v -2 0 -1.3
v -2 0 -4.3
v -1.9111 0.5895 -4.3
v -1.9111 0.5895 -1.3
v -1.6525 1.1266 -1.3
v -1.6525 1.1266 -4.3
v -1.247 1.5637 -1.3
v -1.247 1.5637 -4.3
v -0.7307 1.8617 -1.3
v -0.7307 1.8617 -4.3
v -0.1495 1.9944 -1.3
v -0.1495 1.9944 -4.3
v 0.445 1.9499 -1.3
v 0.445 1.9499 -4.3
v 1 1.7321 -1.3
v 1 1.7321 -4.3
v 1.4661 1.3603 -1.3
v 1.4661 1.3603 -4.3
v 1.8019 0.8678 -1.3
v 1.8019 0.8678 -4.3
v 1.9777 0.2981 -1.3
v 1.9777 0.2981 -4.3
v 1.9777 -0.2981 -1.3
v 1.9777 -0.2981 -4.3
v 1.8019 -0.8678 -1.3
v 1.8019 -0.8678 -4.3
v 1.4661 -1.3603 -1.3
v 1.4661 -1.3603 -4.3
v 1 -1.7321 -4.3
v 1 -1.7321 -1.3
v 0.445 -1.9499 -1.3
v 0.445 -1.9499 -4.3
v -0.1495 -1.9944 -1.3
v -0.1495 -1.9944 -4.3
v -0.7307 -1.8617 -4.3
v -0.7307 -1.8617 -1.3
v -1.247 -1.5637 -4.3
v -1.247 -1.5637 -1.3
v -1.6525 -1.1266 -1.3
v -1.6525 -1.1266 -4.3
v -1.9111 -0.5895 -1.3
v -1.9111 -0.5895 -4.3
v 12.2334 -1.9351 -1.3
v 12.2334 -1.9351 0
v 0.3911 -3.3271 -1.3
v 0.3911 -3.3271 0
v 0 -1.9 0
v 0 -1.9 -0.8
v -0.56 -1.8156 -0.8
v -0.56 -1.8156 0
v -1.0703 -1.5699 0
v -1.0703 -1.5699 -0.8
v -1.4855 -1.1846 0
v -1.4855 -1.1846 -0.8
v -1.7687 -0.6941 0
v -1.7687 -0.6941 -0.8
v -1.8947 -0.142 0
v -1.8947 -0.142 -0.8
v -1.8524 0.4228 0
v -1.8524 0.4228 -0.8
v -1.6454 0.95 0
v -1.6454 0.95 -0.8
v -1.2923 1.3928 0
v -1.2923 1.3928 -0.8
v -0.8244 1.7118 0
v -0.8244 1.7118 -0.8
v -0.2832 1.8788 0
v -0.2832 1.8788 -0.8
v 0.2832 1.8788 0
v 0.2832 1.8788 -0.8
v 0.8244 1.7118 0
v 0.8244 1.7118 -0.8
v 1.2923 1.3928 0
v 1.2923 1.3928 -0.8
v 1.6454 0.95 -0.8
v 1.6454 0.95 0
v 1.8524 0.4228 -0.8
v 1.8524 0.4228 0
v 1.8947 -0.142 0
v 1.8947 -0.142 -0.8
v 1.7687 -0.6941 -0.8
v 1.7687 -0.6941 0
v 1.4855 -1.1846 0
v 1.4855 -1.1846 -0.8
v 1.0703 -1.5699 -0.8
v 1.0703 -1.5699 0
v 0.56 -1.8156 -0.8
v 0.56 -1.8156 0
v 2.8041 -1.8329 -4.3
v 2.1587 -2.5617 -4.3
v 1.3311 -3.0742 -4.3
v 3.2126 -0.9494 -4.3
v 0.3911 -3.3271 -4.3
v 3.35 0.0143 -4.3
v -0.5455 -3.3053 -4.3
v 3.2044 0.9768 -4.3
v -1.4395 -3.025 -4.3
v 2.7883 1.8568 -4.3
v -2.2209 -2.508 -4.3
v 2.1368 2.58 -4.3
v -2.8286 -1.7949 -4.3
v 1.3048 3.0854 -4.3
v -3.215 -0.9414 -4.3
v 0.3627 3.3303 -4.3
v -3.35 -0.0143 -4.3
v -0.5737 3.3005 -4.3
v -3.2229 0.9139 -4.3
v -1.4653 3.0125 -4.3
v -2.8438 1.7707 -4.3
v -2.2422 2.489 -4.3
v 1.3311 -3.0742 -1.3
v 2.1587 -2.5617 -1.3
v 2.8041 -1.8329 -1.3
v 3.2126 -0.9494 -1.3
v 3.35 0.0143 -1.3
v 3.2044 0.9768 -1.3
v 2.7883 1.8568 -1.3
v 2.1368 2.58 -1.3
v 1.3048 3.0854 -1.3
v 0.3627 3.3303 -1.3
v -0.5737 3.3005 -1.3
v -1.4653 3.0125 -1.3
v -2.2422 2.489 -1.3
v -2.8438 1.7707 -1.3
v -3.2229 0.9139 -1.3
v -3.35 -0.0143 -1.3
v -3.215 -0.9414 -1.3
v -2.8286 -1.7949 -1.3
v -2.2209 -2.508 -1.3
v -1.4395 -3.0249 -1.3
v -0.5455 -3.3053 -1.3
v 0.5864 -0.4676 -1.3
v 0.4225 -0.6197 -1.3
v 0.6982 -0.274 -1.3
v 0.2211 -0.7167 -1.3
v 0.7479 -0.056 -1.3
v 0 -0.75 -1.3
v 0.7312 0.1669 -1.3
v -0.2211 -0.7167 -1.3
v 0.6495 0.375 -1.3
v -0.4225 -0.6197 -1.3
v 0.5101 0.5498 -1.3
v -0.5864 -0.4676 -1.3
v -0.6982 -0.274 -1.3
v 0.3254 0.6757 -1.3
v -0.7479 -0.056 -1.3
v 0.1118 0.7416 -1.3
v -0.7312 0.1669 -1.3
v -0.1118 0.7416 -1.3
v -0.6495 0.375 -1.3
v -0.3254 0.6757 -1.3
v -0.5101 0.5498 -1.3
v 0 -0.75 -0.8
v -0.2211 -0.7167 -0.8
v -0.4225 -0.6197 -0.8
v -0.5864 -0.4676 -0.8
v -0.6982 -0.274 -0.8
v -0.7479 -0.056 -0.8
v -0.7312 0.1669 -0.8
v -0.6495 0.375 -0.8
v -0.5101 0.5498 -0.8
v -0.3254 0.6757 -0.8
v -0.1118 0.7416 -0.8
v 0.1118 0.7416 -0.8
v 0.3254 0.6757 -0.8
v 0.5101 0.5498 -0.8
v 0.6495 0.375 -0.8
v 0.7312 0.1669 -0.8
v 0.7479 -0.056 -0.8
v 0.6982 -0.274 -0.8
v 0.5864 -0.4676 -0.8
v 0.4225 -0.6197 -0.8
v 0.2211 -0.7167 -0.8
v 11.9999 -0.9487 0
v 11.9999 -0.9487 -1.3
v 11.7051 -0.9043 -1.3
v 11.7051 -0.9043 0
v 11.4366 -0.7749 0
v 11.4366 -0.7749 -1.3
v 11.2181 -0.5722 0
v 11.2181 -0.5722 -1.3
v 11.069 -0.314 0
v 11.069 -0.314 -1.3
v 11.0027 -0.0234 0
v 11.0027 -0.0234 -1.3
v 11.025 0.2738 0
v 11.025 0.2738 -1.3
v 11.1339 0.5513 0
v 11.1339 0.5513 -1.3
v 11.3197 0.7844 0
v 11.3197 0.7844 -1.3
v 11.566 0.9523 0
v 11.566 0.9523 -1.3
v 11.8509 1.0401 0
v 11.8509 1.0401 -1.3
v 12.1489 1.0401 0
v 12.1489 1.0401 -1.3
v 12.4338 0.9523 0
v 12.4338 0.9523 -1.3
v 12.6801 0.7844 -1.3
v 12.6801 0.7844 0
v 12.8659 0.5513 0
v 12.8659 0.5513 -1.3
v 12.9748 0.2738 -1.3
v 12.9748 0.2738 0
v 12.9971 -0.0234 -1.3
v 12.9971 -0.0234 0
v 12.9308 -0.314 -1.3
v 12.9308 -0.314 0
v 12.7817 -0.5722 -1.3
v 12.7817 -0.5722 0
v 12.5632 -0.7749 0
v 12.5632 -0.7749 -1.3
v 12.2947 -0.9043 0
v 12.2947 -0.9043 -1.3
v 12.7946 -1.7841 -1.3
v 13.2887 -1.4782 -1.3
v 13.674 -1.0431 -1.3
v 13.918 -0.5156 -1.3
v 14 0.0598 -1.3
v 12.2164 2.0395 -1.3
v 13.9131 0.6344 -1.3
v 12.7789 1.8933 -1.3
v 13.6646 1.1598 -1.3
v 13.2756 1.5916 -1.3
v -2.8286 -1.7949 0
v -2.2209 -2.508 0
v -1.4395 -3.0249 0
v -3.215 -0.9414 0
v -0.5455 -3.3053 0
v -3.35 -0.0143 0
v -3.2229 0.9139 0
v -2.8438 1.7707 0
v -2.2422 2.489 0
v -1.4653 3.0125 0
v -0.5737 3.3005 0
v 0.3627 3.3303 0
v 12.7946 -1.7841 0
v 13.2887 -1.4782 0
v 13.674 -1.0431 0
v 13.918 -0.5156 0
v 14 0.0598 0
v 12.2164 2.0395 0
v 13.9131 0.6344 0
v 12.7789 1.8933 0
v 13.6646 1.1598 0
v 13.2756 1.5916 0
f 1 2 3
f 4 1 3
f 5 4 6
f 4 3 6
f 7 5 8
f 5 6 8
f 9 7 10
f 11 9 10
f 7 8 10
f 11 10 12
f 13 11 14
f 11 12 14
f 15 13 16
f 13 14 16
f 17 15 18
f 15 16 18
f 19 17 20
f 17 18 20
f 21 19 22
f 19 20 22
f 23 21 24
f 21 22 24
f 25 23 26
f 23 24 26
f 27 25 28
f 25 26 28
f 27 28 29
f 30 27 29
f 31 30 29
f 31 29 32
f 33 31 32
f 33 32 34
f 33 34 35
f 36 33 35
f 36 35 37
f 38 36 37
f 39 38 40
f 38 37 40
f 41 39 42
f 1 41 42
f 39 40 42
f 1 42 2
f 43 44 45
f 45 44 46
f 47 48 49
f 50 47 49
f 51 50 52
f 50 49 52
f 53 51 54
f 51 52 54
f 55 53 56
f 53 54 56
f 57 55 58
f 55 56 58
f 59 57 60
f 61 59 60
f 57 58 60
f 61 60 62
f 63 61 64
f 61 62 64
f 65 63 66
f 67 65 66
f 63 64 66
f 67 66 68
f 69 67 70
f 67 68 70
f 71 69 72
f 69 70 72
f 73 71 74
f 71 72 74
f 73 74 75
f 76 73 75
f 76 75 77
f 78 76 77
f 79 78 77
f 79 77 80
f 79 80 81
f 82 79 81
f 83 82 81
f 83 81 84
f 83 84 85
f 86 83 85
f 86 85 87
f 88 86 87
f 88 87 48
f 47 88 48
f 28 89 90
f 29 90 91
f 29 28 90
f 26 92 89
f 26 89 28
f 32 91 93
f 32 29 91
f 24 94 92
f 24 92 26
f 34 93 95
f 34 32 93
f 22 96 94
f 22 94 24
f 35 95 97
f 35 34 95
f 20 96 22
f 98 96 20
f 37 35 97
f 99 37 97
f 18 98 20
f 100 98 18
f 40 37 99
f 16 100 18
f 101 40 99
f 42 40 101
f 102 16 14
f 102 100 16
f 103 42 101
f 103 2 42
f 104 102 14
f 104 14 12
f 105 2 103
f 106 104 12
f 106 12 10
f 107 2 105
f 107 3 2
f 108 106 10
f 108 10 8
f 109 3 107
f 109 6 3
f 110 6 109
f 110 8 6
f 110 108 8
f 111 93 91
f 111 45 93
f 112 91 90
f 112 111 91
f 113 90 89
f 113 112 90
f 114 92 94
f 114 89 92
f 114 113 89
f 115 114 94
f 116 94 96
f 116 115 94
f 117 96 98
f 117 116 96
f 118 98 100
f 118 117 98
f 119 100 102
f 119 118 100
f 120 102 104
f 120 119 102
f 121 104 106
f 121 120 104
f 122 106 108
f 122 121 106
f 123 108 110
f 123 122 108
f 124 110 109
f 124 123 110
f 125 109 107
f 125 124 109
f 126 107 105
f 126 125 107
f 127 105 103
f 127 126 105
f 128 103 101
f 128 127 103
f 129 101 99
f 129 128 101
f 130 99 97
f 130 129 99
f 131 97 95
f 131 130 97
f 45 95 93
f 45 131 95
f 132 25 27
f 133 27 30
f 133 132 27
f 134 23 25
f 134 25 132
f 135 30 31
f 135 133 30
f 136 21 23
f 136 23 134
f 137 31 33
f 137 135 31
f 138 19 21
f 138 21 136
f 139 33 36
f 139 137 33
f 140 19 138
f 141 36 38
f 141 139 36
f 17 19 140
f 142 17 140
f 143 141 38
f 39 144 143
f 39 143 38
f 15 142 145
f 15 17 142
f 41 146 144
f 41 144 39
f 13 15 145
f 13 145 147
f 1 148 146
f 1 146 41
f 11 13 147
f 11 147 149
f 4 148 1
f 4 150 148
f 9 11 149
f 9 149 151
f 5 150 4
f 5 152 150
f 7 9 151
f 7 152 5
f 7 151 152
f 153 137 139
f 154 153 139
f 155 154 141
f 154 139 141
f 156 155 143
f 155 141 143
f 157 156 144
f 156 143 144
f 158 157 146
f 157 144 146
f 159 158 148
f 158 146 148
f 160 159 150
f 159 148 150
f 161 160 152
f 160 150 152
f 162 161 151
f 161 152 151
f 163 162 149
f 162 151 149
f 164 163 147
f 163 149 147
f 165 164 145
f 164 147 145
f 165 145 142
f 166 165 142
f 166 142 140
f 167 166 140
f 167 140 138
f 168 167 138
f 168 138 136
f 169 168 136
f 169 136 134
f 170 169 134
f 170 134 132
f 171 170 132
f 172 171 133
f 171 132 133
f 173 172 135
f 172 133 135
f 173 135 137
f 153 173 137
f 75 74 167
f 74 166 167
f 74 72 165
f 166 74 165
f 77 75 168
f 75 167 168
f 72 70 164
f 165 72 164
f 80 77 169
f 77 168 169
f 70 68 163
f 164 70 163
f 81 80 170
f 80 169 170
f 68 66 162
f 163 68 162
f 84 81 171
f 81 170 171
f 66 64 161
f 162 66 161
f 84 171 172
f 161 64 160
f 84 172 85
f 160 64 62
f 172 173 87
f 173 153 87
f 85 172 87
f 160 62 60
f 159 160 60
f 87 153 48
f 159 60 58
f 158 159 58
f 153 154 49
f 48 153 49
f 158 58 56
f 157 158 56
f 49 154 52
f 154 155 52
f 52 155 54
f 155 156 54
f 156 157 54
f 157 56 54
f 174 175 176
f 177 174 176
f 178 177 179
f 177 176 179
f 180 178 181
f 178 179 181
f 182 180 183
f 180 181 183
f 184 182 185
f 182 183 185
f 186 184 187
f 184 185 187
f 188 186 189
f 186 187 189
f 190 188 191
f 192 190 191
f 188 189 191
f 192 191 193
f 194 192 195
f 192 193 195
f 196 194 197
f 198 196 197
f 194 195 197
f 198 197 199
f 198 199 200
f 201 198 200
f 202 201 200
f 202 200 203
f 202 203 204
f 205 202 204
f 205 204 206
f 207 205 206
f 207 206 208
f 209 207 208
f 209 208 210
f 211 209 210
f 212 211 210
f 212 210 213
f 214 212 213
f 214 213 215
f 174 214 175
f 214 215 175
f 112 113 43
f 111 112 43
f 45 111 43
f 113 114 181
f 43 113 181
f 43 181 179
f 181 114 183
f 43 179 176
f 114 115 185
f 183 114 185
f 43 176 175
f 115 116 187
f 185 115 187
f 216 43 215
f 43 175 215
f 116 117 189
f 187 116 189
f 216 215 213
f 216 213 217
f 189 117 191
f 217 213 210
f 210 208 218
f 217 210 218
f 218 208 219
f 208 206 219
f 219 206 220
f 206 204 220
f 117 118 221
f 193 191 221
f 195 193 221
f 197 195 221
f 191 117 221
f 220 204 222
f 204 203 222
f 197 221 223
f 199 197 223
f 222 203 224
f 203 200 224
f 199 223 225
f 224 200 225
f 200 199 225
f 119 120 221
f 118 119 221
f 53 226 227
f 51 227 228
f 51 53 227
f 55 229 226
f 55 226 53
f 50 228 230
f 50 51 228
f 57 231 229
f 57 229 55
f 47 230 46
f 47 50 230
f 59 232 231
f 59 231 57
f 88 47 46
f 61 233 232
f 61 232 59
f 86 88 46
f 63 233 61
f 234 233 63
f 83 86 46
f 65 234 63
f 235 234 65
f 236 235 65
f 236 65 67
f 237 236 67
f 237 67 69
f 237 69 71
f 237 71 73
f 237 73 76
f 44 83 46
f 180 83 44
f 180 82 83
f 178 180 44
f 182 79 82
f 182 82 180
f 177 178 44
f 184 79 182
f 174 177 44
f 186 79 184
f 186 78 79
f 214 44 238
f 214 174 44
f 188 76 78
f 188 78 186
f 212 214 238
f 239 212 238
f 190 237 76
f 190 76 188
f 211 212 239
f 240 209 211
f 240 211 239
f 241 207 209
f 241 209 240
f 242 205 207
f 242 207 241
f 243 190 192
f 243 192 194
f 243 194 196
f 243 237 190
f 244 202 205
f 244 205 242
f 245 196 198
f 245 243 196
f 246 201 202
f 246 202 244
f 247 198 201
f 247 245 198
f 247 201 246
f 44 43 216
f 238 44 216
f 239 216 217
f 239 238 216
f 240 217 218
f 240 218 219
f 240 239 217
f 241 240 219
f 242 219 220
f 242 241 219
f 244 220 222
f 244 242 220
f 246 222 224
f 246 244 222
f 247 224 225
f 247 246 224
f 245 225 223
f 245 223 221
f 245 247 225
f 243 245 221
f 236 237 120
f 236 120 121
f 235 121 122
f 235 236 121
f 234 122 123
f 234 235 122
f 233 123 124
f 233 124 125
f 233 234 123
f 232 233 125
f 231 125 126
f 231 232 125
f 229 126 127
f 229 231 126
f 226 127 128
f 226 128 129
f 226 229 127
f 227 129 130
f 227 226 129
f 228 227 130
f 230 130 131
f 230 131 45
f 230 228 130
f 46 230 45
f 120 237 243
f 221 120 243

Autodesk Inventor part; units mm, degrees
ref_plane "YZ Plane" through (0, 0, 0) normal (1, 0, 0) x (0, 1, 0)
ref_plane "XZ Plane" through (0, 0, 0) normal (0, 1, 0) x (-1, 0, 0)
ref_plane "XY Plane" through (0, 0, 0) normal (0, 0, 1) x (1, 0, 0)
sketch "Sketch1" plane through (0, 0, 0) normal (0, 0, 1) x (1, 0, 0)
  arc A0 (0.3627, 3.3303) -> (0.3911, -3.3271) centre (0, 0) ccw
  arc A1 (12.2334, -1.9351) -> (12.2164, 2.0395) centre (11.9999, 0.0513) ccw
  line L0 (0.3627, 3.3303) -> (12.2164, 2.0395)
  line L1 (12.2334, -1.9351) -> (0.3911, -3.3271)
  dimension "d0" = 6.7
  dimension "d2" = 4
  dimension "d3" = 12
extrude "Extrusion1" add sketch "Sketch1" against normal blind 1.3
sketch "Sketch2" plane through (0, 0, -1.3) normal (0, 0, -1) x (-1, 0, 0)
  arc A0 (-0.3911, -3.3271) -> (-0.3627, 3.3303) centre (0, 0) ccw projected
  circle A1 centre (0, 0) radius 3.35
  dimension "d6" = 6.7
extrude "Extrusion2" add sketch "Sketch2" along normal blind 3
sketch "Sketch3" plane through (0, 0, 0) normal (0, 0, 1) x (1, 0, 0)
  arc A0 (0.3627, 3.3303) -> (0.3911, -3.3271) centre (0, 0) ccw projected
hole "Hole1" at (0, 0, 0) direction (0, 0, -1) diameter 1.5 end through all counterbore diameter 3.8 counterbore depth 0.8
sketch "Sketch4" plane through (0, 0, -4.3) normal (0, 0, -1) x (-1, 0, 0)
  circle A0 centre (0, 0) radius 0.75 projected
  circle A1 centre (0, 0) radius 3.35 projected
  circle A2 centre (0, 0) radius 2
  dimension "d17" = 4
extrude "Extrusion3" cut sketch "Sketch4" against normal blind 3 contours A2
sketch "Sketch5" plane through (0, 0, 0) normal (0, 0, 1) x (1, 0, 0)
  arc A0 (12.2334, -1.9351) -> (12.2164, 2.0395) centre (11.9999, 0.0513) ccw projected
hole "Hole2" at (11.9999, 0.0513, 0) direction (0, 0, -1) diameter 2 end through all
properties part number "Servo Arm"
